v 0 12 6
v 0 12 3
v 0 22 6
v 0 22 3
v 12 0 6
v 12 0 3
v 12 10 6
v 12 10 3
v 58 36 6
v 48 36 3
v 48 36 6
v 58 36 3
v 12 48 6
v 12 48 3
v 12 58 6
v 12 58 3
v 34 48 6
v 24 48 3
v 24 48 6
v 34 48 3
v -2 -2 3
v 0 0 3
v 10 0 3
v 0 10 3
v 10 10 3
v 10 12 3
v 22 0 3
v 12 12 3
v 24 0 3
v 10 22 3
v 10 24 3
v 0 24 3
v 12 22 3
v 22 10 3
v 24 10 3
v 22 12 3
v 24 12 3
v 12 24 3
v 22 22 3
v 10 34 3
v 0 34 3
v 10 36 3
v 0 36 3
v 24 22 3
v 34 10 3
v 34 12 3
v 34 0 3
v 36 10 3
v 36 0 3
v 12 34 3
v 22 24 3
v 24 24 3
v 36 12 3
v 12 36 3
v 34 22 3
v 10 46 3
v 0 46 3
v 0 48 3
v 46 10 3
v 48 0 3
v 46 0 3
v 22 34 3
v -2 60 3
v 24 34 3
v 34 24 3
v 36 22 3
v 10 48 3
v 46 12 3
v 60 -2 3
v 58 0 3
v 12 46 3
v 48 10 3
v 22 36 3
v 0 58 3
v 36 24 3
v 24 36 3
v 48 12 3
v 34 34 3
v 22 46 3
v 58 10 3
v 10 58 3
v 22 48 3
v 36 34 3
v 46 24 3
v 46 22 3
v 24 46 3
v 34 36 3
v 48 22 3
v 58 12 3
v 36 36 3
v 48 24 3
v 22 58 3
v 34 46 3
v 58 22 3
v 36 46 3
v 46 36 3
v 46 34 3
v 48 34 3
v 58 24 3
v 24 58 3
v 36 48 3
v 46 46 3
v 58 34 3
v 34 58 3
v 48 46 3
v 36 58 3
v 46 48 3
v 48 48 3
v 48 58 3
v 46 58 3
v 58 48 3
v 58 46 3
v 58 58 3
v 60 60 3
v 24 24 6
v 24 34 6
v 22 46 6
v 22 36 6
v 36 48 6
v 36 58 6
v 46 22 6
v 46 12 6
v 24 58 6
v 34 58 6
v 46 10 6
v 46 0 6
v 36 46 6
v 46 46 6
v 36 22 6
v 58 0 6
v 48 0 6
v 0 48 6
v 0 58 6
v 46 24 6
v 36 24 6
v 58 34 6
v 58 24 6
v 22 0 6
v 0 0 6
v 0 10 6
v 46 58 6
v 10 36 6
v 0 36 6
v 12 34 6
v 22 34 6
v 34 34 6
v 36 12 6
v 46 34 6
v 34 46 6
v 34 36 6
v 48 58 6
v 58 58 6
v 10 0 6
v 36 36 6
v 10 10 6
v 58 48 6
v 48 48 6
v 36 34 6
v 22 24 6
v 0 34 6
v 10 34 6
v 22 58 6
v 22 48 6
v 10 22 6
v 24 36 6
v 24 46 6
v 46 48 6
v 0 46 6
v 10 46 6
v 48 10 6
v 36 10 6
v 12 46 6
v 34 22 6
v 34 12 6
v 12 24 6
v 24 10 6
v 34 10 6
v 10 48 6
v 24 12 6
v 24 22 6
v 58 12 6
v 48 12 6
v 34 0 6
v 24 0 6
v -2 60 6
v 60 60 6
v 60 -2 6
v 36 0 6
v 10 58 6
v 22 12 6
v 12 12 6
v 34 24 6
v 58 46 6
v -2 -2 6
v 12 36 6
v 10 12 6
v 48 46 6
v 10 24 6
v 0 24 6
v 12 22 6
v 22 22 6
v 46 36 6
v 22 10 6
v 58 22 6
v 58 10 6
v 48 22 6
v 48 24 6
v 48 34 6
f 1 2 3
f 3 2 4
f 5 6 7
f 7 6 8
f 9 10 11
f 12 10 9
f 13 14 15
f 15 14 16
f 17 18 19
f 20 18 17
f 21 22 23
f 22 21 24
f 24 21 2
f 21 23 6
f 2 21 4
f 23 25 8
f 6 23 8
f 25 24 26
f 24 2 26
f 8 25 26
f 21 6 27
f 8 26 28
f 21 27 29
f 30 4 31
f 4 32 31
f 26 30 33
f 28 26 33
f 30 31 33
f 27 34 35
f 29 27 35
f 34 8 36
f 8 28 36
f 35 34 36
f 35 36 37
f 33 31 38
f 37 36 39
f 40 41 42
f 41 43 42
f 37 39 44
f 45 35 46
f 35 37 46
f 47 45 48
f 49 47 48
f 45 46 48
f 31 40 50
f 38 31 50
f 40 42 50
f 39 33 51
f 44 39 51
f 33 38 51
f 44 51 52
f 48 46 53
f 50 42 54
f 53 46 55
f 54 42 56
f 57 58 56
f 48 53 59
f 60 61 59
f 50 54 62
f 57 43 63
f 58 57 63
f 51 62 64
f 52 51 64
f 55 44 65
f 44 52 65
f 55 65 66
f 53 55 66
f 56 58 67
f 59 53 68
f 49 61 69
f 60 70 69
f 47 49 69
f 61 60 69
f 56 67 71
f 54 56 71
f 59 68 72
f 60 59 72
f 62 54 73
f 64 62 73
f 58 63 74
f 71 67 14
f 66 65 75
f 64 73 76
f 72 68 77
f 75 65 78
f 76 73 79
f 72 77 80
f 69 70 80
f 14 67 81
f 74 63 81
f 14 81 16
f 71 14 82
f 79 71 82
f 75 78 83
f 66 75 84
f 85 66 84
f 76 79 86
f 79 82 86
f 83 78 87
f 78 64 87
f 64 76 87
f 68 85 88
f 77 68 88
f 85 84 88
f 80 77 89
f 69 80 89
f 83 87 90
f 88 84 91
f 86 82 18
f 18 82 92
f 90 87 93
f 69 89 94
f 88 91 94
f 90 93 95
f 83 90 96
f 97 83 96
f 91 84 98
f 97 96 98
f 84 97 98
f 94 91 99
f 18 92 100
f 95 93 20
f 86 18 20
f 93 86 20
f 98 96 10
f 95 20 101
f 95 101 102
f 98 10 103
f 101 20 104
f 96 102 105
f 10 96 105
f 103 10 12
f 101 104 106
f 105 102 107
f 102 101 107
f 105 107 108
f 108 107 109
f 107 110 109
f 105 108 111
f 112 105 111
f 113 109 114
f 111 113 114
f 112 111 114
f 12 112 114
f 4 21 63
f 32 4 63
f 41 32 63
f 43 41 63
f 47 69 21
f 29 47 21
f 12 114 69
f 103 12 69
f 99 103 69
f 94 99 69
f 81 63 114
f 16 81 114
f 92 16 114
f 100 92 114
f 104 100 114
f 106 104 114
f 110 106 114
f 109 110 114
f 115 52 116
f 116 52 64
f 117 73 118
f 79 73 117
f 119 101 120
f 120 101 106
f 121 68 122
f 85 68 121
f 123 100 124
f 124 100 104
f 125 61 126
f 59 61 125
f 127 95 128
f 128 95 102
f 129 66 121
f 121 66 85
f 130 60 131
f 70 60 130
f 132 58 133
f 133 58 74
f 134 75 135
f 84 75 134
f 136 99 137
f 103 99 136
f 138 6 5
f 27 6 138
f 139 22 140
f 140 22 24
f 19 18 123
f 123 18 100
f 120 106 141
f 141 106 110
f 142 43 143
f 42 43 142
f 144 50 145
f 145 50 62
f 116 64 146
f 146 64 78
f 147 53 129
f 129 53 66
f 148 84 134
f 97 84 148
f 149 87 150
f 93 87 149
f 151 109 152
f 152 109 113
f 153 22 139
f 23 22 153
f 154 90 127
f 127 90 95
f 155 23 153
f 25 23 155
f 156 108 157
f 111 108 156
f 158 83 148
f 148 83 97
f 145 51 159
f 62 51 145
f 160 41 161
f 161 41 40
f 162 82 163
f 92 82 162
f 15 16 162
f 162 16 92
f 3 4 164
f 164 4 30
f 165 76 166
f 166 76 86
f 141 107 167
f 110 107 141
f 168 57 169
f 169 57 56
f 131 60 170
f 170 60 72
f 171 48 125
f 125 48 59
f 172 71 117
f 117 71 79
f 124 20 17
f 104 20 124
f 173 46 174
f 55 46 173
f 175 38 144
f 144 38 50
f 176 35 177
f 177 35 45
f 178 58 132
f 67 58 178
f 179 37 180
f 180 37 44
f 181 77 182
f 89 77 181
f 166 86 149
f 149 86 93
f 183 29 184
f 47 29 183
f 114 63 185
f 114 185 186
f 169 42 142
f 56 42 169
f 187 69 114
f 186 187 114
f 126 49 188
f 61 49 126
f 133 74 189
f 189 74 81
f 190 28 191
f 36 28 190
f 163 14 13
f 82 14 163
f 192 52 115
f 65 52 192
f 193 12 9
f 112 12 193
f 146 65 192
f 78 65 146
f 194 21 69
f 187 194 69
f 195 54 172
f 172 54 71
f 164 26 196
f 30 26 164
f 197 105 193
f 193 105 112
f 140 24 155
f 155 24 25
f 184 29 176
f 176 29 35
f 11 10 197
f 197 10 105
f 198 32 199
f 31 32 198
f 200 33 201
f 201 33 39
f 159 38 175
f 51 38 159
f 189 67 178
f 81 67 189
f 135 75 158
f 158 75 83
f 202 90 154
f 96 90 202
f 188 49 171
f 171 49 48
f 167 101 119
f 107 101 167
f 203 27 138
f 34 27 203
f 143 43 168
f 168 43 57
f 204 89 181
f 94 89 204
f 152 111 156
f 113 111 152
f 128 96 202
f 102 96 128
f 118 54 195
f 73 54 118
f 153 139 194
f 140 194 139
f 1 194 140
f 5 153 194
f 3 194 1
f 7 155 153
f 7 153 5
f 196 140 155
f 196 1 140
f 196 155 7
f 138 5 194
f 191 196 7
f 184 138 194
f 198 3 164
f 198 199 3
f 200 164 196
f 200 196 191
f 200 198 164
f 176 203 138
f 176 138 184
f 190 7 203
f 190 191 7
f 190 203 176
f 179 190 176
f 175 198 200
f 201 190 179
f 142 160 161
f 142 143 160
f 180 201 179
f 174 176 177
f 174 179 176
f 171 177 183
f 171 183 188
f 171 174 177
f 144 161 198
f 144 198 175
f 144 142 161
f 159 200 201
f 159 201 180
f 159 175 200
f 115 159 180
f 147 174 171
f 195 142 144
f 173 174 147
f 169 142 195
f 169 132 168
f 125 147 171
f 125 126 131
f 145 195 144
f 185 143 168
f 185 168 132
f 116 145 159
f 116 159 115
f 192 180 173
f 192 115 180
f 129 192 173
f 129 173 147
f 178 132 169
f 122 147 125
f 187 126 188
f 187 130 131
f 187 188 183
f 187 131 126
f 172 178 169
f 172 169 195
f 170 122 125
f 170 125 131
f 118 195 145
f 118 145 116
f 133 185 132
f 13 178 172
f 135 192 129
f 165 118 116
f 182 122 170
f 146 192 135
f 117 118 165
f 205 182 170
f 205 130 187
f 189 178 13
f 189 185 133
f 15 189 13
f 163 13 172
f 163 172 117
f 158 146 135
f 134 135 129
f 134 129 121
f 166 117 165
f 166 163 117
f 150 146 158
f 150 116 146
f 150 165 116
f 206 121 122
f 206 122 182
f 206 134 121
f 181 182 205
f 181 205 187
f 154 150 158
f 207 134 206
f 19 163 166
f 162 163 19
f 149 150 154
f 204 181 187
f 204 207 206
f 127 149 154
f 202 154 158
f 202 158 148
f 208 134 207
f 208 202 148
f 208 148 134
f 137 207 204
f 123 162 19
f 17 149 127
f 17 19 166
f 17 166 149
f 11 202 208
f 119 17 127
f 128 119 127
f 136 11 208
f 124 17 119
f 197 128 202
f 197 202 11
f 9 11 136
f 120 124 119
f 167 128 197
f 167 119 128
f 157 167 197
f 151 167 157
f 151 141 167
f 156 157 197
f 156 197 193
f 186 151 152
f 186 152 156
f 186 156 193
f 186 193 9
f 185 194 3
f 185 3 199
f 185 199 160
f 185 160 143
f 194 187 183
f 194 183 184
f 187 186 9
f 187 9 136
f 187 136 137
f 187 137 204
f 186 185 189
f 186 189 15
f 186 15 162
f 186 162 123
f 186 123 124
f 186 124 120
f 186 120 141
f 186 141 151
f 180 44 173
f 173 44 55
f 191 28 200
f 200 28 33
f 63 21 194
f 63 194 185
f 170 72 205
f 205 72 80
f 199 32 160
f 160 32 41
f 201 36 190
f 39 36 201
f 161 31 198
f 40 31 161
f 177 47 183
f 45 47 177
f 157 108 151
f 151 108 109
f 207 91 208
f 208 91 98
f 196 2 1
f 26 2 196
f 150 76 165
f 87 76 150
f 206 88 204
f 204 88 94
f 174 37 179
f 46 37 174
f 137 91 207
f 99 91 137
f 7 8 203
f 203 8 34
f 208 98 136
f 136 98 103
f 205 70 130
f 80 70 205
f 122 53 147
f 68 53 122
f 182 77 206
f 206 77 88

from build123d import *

# Parameters (mm, degrees)
BOX002_W         = 10
BOX002_H         = 10
BOX002_DEPTH     = 10
ARRAY001_X_COUNT = 5
ARRAY001_X_PITCH = 12
ARRAY001_Y_COUNT = 5
ARRAY001_Y_PITCH = 12
BOX003_W         = 62
BOX003_H         = 62
BOX003_DEPTH     = 3


with BuildPart() as array001:
    # Box002 → Box002 (new body)
    with BuildSketch(Plane.XY):
        with Locations((5, 5)):
            Rectangle(BOX002_W, BOX002_H)
    extrude(amount=BOX002_DEPTH)

    # Array001 X: Array001 ×5


with BuildPart() as array001_1:
    add(array001.part)
    with Locations(*[(i * ARRAY001_X_PITCH, 0, 0) for i in range(1, ARRAY001_X_COUNT)]):
        add(array001.part)

    # Array001 Y: Array001 ×5


with BuildPart() as array001_2:
    add(array001_1.part)
    with Locations(*[(0, i * ARRAY001_Y_PITCH, 0) for i in range(1, ARRAY001_Y_COUNT)]):
        add(array001_1.part)


with BuildPart() as cut001:
    # Box003 → Box003 (new body)
    with BuildSketch(Plane(origin=(-2, -2, 3), x_dir=(1, 0, 0), z_dir=(0, 0, 1))):
        with Locations((31, 31)):
            Rectangle(BOX003_W, BOX003_H)
    extrude(amount=BOX003_DEPTH)

    # Cut001: cut Array001
    add(array001_2.part, mode=Mode.SUBTRACT)


solid = cut001.part
